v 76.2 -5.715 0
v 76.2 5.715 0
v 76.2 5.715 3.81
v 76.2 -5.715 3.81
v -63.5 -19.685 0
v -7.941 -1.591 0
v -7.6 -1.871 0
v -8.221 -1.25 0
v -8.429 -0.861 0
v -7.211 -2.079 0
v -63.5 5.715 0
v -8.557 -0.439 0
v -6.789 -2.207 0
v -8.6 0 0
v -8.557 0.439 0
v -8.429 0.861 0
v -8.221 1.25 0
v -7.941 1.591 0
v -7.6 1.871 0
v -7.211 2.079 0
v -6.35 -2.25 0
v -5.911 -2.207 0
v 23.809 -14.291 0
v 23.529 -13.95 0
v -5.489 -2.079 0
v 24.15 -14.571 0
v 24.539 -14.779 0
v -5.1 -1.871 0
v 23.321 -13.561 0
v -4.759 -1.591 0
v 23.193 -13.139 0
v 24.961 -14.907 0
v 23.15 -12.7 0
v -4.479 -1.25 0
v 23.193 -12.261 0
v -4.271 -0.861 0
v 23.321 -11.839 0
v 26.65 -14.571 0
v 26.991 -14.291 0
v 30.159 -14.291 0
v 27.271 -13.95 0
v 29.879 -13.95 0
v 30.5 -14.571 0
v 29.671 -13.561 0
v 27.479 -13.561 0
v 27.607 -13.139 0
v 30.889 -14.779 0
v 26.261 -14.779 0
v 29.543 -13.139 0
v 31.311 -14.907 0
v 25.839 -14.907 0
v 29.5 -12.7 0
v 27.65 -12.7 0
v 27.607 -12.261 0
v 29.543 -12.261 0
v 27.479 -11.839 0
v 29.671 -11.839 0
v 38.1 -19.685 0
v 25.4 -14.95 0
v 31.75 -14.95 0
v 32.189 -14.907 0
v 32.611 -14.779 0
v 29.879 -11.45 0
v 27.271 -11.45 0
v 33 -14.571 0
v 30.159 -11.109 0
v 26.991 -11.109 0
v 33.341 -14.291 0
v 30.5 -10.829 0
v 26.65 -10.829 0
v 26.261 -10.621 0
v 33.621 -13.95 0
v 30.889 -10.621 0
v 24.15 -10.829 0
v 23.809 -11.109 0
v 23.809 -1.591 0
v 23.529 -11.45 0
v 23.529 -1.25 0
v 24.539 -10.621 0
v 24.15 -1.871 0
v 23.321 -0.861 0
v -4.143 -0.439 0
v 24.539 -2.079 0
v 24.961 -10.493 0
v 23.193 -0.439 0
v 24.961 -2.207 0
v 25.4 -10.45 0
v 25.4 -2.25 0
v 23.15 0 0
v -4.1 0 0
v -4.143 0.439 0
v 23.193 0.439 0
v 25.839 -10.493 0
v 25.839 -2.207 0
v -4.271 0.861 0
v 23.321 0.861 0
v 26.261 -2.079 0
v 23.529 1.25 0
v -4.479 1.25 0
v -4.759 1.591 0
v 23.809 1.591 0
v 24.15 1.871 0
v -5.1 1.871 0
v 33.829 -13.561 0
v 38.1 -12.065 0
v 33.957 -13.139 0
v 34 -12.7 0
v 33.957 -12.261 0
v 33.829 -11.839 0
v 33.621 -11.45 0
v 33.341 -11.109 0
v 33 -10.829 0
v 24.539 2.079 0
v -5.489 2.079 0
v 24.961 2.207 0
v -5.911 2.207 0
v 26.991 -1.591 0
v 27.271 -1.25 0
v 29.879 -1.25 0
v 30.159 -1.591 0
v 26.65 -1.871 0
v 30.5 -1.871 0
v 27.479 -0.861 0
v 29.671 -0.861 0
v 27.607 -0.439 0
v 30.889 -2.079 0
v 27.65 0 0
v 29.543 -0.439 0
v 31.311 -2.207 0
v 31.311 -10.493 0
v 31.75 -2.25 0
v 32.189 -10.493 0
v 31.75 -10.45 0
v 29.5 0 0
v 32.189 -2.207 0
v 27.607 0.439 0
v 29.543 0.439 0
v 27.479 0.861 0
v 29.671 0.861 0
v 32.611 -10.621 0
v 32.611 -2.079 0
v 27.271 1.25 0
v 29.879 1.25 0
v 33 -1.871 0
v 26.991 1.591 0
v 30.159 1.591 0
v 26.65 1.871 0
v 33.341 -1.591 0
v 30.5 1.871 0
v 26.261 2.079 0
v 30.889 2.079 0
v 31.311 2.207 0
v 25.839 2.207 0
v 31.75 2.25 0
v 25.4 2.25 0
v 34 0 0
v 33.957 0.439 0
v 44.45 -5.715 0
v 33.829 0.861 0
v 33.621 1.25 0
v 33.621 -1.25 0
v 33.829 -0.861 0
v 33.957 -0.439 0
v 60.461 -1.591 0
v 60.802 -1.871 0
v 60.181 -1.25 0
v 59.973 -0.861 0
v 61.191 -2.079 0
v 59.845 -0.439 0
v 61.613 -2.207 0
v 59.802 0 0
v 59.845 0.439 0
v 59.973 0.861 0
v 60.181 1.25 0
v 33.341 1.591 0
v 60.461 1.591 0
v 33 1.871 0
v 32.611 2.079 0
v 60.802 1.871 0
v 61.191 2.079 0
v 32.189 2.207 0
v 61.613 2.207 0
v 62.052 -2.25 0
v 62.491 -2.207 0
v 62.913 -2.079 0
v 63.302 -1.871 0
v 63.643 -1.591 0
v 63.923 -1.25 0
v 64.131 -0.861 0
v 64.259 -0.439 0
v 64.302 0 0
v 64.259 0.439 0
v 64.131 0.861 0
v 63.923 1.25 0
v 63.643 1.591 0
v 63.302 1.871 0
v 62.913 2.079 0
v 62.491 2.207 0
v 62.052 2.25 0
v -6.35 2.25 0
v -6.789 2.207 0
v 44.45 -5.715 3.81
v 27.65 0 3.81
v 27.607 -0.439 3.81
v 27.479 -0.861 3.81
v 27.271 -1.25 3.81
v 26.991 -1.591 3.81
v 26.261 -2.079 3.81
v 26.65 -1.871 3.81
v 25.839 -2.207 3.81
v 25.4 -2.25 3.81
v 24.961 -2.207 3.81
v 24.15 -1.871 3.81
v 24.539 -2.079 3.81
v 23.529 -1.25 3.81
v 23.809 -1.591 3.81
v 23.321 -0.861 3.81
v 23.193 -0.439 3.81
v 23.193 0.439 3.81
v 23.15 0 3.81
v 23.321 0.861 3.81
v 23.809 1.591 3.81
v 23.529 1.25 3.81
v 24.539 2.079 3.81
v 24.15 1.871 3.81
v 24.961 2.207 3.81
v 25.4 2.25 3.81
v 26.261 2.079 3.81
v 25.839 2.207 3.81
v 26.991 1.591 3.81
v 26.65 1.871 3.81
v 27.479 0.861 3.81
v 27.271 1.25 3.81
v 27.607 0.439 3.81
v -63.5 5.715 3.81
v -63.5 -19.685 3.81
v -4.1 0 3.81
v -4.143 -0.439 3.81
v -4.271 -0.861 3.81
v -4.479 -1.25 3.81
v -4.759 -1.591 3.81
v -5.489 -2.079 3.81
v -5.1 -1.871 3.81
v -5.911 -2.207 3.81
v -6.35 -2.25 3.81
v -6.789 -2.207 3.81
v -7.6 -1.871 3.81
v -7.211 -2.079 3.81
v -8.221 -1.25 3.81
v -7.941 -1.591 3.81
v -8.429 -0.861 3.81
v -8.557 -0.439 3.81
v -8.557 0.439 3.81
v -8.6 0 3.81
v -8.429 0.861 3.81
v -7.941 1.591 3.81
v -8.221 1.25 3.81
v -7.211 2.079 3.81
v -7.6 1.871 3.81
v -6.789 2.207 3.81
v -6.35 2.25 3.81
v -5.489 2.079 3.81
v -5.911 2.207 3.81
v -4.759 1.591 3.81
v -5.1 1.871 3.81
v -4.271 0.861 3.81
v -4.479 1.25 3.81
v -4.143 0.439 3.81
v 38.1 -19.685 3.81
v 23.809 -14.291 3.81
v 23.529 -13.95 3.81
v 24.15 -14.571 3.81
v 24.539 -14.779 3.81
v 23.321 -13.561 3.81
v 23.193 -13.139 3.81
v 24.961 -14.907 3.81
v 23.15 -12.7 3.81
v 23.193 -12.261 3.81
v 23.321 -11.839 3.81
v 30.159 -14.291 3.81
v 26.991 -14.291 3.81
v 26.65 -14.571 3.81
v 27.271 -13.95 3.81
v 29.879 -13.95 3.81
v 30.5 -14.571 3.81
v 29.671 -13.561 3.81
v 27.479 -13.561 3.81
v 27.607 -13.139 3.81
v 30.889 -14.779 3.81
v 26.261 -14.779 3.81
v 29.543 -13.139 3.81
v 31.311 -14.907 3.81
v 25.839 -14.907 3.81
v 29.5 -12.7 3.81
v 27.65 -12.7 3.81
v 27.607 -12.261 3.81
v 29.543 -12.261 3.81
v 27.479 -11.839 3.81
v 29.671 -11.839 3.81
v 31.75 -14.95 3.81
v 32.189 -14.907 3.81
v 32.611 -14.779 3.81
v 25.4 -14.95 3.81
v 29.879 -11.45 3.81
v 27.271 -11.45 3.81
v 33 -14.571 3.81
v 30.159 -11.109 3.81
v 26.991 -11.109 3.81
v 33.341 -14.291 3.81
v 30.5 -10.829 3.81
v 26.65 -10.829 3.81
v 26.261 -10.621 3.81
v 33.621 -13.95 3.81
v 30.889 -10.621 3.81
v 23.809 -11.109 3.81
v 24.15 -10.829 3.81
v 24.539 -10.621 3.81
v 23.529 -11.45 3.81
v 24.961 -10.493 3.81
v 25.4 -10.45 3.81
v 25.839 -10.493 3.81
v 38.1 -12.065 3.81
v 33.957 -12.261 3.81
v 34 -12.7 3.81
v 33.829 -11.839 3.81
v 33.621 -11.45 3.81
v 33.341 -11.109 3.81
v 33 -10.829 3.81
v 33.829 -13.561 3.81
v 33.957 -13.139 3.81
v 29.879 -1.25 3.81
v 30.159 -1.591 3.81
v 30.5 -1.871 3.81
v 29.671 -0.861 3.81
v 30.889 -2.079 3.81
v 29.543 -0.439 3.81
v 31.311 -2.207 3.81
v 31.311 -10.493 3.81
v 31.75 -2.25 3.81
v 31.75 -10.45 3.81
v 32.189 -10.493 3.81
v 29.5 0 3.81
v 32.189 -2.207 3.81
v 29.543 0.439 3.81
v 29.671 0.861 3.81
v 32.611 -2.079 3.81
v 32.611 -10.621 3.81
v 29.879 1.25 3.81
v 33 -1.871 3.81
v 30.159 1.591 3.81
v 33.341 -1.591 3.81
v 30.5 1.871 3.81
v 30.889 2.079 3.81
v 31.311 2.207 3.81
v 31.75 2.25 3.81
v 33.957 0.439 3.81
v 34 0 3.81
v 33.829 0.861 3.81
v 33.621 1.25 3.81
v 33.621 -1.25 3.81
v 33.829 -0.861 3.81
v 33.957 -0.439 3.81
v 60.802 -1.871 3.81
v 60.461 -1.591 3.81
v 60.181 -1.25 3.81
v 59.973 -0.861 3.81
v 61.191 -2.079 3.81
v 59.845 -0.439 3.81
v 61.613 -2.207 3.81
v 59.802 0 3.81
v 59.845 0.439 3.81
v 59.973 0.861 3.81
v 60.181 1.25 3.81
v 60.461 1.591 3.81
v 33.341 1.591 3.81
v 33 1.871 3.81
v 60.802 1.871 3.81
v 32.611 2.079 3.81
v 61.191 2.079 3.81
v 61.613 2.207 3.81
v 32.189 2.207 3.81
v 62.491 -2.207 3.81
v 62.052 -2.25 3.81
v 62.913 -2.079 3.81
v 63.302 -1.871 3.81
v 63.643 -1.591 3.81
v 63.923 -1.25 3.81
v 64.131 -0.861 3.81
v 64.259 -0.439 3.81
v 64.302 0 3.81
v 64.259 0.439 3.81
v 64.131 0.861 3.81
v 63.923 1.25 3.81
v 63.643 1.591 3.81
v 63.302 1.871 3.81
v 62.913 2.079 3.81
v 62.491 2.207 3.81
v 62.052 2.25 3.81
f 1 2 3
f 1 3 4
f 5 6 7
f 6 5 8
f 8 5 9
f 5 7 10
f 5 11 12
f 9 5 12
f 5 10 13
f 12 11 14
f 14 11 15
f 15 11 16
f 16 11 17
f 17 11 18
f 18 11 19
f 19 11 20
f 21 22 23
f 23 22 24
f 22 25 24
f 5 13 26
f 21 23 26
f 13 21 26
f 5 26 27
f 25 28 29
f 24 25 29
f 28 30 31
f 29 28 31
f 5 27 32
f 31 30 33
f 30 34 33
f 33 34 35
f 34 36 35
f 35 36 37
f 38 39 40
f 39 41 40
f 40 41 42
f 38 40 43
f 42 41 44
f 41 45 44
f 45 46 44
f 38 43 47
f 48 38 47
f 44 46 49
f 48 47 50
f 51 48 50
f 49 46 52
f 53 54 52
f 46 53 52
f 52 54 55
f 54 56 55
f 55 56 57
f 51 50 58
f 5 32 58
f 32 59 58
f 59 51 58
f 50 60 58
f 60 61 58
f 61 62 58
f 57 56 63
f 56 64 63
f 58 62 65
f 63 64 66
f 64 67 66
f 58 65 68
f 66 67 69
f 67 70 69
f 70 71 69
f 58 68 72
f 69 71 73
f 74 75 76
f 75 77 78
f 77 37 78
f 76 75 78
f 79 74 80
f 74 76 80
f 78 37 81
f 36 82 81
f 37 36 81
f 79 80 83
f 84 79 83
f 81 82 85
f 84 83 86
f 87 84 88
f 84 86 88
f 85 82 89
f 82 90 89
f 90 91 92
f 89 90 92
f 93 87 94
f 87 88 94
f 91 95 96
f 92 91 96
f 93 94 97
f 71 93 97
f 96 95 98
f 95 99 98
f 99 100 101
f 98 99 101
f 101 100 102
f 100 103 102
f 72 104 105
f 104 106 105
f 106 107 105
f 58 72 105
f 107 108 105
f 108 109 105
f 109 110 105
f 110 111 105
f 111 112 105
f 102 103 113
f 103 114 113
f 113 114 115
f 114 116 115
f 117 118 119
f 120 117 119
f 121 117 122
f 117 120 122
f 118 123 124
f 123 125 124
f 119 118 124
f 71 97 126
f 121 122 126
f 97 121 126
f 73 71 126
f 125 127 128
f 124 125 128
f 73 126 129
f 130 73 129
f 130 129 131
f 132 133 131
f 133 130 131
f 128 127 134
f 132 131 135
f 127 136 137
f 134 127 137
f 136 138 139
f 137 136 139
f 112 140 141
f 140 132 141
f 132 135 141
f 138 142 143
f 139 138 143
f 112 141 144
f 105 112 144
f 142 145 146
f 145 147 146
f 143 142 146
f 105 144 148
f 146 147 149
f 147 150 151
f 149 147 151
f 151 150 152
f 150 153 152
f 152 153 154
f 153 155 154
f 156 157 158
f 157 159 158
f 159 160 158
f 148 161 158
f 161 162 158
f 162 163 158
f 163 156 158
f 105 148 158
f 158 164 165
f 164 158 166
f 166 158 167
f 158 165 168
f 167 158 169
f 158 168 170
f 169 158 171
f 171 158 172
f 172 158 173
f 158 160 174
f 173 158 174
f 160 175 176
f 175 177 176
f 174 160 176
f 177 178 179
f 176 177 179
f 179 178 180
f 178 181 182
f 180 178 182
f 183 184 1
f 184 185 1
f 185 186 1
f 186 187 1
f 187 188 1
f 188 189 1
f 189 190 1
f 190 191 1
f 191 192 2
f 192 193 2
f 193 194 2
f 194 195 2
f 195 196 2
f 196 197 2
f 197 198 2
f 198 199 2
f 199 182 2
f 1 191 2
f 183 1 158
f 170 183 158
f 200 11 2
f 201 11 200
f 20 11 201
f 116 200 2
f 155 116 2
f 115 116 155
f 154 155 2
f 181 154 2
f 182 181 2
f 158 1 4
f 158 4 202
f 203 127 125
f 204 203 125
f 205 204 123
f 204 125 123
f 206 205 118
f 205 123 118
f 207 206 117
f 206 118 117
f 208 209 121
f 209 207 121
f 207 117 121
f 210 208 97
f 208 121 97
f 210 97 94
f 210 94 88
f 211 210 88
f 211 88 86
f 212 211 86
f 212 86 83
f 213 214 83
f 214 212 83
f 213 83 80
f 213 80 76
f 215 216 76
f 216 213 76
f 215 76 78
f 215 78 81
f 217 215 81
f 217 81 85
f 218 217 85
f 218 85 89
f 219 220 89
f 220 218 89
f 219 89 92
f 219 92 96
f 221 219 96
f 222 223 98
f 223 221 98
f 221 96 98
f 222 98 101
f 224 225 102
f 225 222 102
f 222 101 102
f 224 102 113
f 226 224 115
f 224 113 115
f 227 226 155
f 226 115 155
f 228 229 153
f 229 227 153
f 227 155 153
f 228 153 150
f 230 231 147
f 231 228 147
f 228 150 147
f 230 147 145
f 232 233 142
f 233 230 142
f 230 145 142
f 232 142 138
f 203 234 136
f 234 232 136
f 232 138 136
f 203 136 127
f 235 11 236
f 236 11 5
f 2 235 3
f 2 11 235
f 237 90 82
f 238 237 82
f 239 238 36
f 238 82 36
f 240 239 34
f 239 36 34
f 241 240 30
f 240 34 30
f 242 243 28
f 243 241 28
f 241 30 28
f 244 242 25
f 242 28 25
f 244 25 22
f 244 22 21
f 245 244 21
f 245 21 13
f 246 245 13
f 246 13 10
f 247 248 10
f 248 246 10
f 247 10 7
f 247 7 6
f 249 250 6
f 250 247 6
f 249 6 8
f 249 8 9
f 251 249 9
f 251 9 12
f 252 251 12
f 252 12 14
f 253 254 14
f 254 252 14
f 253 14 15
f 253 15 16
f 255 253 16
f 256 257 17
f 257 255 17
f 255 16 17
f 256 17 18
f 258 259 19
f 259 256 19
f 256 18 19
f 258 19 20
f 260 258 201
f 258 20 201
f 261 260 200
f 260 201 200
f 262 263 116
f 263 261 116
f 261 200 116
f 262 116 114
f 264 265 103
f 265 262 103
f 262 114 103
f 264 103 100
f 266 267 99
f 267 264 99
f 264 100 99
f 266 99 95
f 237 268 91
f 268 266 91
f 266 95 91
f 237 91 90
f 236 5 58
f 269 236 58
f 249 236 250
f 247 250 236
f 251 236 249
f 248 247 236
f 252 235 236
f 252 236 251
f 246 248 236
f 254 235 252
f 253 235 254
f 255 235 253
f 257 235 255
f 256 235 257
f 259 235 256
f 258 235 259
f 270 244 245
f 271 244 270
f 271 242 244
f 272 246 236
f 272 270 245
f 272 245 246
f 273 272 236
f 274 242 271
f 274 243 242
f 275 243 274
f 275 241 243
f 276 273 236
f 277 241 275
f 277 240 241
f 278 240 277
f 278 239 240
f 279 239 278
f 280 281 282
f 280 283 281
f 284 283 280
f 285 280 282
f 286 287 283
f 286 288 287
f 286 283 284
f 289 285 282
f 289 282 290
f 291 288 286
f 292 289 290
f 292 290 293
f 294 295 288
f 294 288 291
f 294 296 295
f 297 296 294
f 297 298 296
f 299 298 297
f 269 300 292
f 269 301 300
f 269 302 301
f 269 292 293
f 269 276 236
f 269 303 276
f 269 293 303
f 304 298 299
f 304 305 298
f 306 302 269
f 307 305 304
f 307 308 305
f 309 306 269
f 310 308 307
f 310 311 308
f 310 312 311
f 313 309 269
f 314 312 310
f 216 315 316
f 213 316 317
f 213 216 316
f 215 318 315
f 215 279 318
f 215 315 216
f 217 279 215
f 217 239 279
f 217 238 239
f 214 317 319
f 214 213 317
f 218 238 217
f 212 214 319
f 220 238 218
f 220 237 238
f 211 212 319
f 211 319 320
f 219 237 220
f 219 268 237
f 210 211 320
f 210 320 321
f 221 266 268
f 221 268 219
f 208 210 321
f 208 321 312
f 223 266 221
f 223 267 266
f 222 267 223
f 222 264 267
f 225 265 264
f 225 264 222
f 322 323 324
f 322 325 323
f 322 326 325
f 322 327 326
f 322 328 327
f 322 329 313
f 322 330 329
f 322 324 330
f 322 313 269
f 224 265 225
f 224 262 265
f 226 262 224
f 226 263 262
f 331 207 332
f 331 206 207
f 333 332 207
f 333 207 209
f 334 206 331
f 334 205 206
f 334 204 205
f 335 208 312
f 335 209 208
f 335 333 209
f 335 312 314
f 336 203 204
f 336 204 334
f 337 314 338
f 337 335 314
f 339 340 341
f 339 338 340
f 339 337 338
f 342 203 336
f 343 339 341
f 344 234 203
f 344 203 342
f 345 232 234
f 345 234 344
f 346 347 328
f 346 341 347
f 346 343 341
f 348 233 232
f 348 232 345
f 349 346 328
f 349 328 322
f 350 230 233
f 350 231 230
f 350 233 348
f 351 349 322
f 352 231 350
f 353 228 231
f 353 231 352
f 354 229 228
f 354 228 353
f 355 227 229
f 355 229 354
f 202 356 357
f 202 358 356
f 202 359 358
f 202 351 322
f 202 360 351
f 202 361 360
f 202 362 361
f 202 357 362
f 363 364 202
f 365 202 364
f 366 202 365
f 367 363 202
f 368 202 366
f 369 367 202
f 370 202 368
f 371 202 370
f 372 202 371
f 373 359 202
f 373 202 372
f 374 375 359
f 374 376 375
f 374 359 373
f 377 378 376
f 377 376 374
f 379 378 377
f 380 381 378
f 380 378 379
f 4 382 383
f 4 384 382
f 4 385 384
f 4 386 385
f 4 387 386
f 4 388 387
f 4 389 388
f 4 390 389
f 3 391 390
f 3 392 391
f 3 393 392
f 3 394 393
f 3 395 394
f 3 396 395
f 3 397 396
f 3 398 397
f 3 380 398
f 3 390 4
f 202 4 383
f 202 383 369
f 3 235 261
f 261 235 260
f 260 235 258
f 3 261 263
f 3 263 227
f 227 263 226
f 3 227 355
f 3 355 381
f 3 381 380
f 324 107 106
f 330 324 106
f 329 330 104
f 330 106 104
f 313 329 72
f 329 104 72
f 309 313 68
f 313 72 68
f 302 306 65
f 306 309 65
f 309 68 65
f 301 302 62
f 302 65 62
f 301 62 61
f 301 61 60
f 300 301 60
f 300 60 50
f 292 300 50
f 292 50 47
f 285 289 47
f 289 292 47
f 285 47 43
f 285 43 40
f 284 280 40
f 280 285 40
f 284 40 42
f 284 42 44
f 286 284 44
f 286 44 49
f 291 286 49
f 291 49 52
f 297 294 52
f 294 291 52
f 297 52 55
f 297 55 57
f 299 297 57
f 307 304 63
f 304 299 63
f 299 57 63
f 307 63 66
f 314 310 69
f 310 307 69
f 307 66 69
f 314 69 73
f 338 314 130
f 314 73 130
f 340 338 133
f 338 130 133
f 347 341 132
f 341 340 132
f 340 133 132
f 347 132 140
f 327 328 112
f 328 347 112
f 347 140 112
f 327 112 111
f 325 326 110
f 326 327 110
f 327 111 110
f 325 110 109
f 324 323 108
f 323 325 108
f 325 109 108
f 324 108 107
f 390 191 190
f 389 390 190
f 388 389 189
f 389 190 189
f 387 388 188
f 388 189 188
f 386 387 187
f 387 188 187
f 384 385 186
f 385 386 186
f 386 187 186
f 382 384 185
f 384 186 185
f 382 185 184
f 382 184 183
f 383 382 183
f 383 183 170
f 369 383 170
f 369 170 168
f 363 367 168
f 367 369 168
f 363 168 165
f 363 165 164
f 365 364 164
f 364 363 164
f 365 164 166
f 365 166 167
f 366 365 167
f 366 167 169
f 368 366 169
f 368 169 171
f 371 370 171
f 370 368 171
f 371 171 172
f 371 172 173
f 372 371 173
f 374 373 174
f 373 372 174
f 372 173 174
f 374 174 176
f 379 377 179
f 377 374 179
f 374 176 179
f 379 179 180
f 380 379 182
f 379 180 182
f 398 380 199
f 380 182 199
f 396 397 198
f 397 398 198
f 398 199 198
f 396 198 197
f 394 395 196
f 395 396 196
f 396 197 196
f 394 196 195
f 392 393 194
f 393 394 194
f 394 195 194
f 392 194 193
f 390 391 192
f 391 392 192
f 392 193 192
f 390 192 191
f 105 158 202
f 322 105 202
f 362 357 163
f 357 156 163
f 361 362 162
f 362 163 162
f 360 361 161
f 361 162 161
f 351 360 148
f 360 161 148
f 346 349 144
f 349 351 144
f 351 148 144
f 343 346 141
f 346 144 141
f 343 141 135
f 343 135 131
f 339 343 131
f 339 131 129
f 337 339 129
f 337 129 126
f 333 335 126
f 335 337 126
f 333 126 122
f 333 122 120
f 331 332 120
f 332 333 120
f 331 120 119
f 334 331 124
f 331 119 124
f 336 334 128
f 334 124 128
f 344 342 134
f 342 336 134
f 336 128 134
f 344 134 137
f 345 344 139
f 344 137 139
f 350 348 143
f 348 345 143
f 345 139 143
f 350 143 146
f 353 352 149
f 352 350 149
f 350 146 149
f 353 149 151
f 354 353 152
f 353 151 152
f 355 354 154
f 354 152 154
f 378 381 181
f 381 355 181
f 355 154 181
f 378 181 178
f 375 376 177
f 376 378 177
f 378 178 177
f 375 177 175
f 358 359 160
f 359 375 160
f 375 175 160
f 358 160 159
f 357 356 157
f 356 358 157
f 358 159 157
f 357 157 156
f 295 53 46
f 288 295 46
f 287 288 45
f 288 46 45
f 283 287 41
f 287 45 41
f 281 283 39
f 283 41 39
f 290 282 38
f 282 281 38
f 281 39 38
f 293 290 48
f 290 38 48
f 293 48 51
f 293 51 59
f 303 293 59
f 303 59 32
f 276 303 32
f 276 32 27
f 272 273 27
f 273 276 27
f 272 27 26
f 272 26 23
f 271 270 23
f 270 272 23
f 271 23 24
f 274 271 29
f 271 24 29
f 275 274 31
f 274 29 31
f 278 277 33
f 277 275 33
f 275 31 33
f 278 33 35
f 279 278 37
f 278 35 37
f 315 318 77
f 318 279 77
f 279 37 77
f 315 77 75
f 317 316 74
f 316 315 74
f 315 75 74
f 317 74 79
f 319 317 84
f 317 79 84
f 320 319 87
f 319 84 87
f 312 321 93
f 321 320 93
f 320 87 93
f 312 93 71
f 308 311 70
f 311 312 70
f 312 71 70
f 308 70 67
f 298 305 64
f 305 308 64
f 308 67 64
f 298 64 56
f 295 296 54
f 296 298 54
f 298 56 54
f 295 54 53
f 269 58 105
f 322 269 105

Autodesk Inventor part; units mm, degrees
ref_plane "YZ Plane" through (0, 0, 0) normal (1, 0, 0) x (0, 1, 0)
ref_plane "XZ Plane" through (0, 0, 0) normal (0, 1, 0) x (-1, 0, 0)
ref_plane "XY Plane" through (0, 0, 0) normal (0, 0, 1) x (1, 0, 0)
sketch "Sketch1" plane through (0, 0, 0) normal (0, 0, 1) x (1, 0, 0)
  line L0 (76.2, -5.715) -> (-76.2, -5.715)
  line L1 (-76.2, -5.715) -> (-76.2, 5.715)
  line L2 (-76.2, 5.715) -> (76.2, 5.715)
  line L3 (76.2, 5.715) -> (76.2, -5.715)
  line L4 (76.2, -5.715) -> (-76.2, 5.715) construction
  line L5 (-76.2, -5.715) -> (76.2, 5.715) construction
  circle A0 centre (-6.35, 0) radius 2.25
  circle A1 centre (62.0522, 0) radius 2.25
  circle A2 centre (25.4, 0) radius 2.25
  circle A3 centre (31.75, 0) radius 2.25
  circle A4 centre (25.4, -12.7) radius 2.25
  circle A5 centre (31.75, -12.7) radius 2.25
  line L6 (0, 5.715) -> (-76.2, 5.715)
  line L7 (38.1, 5.715) -> (-63.5, 5.715)
  line L8 (-63.5, 5.715) -> (-63.5, -19.685)
  line L9 (-63.5, -19.685) -> (38.1, -19.685)
  line L10 (38.1, -19.685) -> (38.1, 5.715)
  point P0 (0, 0)
  point P1 (38.1, -5.715)
  point P2 (-63.5, -5.715)
  dimension "d0" = 152.4
  dimension "d1" = 11.43
  dimension "d2" = 4.5
  dimension "d3" = 4.5
  dimension "d4" = 68.4022
  dimension "d5" = 69.85
  dimension "d6" = 4.5
  dimension "d9" = 101.6
  dimension "d12" = 6.35
  dimension "d15" = 12.7
  dimension "d22" = 101.6
  dimension "d23" = 25.4
  dimension "d24" = 6.35
extrude "Extrusion1" add sketch "Sketch1" along normal blind 3.81
fillet "Fillet1" [suppressed]
sketch "Sketch2" plane through (0, 0, 3.81) normal (0, 0, 1) x (1, 0, 0)
  line L0 (76.2, 5.715) -> (-76.2, 5.715) projected
  line L1 (-76.2, 5.715) -> (-76.2, -5.715) projected
  line L2 (-76.2, -5.715) -> (-63.5, -5.715) projected
  line L3 (-63.5, -5.715) -> (-63.5, -19.685) projected
  line L4 (-63.5, -19.685) -> (38.1, -19.685) projected
  line L5 (38.1, -19.685) -> (38.1, -5.715) projected
  line L6 (38.1, -5.715) -> (76.2, -5.715) projected
  line L7 (76.2, -5.715) -> (76.2, 5.715) projected
  circle A0 centre (-6.35, 0) radius 2.25 projected
  circle A1 centre (62.0522, 0) radius 2.25 projected
  circle A2 centre (25.4, 0) radius 2.25 projected
  circle A3 centre (31.75, 0) radius 2.25 projected
  circle A4 centre (31.75, -12.7) radius 2.25 projected
  circle A5 centre (25.4, -12.7) radius 2.25 projected
  line L8 (-63.5, -5.715) -> (-76.2, -5.715)
  line L9 (-76.2, -5.715) -> (-76.2, 5.715)
  line L10 (-76.2, 5.715) -> (-63.5, 5.715)
  line L11 (-63.5, 5.715) -> (-63.5, -5.715)
  point P0 (0, 0)
extrude "Extrusion2" cut sketch "Sketch2" against normal through all contours L11 L2 L1 L0
chamfer "Chamfer1" distance 6.35 angle 45 1 edges at (38.1, -5.715, 1.905)
properties part number "Slide_Climb_Hook_Mounts"
